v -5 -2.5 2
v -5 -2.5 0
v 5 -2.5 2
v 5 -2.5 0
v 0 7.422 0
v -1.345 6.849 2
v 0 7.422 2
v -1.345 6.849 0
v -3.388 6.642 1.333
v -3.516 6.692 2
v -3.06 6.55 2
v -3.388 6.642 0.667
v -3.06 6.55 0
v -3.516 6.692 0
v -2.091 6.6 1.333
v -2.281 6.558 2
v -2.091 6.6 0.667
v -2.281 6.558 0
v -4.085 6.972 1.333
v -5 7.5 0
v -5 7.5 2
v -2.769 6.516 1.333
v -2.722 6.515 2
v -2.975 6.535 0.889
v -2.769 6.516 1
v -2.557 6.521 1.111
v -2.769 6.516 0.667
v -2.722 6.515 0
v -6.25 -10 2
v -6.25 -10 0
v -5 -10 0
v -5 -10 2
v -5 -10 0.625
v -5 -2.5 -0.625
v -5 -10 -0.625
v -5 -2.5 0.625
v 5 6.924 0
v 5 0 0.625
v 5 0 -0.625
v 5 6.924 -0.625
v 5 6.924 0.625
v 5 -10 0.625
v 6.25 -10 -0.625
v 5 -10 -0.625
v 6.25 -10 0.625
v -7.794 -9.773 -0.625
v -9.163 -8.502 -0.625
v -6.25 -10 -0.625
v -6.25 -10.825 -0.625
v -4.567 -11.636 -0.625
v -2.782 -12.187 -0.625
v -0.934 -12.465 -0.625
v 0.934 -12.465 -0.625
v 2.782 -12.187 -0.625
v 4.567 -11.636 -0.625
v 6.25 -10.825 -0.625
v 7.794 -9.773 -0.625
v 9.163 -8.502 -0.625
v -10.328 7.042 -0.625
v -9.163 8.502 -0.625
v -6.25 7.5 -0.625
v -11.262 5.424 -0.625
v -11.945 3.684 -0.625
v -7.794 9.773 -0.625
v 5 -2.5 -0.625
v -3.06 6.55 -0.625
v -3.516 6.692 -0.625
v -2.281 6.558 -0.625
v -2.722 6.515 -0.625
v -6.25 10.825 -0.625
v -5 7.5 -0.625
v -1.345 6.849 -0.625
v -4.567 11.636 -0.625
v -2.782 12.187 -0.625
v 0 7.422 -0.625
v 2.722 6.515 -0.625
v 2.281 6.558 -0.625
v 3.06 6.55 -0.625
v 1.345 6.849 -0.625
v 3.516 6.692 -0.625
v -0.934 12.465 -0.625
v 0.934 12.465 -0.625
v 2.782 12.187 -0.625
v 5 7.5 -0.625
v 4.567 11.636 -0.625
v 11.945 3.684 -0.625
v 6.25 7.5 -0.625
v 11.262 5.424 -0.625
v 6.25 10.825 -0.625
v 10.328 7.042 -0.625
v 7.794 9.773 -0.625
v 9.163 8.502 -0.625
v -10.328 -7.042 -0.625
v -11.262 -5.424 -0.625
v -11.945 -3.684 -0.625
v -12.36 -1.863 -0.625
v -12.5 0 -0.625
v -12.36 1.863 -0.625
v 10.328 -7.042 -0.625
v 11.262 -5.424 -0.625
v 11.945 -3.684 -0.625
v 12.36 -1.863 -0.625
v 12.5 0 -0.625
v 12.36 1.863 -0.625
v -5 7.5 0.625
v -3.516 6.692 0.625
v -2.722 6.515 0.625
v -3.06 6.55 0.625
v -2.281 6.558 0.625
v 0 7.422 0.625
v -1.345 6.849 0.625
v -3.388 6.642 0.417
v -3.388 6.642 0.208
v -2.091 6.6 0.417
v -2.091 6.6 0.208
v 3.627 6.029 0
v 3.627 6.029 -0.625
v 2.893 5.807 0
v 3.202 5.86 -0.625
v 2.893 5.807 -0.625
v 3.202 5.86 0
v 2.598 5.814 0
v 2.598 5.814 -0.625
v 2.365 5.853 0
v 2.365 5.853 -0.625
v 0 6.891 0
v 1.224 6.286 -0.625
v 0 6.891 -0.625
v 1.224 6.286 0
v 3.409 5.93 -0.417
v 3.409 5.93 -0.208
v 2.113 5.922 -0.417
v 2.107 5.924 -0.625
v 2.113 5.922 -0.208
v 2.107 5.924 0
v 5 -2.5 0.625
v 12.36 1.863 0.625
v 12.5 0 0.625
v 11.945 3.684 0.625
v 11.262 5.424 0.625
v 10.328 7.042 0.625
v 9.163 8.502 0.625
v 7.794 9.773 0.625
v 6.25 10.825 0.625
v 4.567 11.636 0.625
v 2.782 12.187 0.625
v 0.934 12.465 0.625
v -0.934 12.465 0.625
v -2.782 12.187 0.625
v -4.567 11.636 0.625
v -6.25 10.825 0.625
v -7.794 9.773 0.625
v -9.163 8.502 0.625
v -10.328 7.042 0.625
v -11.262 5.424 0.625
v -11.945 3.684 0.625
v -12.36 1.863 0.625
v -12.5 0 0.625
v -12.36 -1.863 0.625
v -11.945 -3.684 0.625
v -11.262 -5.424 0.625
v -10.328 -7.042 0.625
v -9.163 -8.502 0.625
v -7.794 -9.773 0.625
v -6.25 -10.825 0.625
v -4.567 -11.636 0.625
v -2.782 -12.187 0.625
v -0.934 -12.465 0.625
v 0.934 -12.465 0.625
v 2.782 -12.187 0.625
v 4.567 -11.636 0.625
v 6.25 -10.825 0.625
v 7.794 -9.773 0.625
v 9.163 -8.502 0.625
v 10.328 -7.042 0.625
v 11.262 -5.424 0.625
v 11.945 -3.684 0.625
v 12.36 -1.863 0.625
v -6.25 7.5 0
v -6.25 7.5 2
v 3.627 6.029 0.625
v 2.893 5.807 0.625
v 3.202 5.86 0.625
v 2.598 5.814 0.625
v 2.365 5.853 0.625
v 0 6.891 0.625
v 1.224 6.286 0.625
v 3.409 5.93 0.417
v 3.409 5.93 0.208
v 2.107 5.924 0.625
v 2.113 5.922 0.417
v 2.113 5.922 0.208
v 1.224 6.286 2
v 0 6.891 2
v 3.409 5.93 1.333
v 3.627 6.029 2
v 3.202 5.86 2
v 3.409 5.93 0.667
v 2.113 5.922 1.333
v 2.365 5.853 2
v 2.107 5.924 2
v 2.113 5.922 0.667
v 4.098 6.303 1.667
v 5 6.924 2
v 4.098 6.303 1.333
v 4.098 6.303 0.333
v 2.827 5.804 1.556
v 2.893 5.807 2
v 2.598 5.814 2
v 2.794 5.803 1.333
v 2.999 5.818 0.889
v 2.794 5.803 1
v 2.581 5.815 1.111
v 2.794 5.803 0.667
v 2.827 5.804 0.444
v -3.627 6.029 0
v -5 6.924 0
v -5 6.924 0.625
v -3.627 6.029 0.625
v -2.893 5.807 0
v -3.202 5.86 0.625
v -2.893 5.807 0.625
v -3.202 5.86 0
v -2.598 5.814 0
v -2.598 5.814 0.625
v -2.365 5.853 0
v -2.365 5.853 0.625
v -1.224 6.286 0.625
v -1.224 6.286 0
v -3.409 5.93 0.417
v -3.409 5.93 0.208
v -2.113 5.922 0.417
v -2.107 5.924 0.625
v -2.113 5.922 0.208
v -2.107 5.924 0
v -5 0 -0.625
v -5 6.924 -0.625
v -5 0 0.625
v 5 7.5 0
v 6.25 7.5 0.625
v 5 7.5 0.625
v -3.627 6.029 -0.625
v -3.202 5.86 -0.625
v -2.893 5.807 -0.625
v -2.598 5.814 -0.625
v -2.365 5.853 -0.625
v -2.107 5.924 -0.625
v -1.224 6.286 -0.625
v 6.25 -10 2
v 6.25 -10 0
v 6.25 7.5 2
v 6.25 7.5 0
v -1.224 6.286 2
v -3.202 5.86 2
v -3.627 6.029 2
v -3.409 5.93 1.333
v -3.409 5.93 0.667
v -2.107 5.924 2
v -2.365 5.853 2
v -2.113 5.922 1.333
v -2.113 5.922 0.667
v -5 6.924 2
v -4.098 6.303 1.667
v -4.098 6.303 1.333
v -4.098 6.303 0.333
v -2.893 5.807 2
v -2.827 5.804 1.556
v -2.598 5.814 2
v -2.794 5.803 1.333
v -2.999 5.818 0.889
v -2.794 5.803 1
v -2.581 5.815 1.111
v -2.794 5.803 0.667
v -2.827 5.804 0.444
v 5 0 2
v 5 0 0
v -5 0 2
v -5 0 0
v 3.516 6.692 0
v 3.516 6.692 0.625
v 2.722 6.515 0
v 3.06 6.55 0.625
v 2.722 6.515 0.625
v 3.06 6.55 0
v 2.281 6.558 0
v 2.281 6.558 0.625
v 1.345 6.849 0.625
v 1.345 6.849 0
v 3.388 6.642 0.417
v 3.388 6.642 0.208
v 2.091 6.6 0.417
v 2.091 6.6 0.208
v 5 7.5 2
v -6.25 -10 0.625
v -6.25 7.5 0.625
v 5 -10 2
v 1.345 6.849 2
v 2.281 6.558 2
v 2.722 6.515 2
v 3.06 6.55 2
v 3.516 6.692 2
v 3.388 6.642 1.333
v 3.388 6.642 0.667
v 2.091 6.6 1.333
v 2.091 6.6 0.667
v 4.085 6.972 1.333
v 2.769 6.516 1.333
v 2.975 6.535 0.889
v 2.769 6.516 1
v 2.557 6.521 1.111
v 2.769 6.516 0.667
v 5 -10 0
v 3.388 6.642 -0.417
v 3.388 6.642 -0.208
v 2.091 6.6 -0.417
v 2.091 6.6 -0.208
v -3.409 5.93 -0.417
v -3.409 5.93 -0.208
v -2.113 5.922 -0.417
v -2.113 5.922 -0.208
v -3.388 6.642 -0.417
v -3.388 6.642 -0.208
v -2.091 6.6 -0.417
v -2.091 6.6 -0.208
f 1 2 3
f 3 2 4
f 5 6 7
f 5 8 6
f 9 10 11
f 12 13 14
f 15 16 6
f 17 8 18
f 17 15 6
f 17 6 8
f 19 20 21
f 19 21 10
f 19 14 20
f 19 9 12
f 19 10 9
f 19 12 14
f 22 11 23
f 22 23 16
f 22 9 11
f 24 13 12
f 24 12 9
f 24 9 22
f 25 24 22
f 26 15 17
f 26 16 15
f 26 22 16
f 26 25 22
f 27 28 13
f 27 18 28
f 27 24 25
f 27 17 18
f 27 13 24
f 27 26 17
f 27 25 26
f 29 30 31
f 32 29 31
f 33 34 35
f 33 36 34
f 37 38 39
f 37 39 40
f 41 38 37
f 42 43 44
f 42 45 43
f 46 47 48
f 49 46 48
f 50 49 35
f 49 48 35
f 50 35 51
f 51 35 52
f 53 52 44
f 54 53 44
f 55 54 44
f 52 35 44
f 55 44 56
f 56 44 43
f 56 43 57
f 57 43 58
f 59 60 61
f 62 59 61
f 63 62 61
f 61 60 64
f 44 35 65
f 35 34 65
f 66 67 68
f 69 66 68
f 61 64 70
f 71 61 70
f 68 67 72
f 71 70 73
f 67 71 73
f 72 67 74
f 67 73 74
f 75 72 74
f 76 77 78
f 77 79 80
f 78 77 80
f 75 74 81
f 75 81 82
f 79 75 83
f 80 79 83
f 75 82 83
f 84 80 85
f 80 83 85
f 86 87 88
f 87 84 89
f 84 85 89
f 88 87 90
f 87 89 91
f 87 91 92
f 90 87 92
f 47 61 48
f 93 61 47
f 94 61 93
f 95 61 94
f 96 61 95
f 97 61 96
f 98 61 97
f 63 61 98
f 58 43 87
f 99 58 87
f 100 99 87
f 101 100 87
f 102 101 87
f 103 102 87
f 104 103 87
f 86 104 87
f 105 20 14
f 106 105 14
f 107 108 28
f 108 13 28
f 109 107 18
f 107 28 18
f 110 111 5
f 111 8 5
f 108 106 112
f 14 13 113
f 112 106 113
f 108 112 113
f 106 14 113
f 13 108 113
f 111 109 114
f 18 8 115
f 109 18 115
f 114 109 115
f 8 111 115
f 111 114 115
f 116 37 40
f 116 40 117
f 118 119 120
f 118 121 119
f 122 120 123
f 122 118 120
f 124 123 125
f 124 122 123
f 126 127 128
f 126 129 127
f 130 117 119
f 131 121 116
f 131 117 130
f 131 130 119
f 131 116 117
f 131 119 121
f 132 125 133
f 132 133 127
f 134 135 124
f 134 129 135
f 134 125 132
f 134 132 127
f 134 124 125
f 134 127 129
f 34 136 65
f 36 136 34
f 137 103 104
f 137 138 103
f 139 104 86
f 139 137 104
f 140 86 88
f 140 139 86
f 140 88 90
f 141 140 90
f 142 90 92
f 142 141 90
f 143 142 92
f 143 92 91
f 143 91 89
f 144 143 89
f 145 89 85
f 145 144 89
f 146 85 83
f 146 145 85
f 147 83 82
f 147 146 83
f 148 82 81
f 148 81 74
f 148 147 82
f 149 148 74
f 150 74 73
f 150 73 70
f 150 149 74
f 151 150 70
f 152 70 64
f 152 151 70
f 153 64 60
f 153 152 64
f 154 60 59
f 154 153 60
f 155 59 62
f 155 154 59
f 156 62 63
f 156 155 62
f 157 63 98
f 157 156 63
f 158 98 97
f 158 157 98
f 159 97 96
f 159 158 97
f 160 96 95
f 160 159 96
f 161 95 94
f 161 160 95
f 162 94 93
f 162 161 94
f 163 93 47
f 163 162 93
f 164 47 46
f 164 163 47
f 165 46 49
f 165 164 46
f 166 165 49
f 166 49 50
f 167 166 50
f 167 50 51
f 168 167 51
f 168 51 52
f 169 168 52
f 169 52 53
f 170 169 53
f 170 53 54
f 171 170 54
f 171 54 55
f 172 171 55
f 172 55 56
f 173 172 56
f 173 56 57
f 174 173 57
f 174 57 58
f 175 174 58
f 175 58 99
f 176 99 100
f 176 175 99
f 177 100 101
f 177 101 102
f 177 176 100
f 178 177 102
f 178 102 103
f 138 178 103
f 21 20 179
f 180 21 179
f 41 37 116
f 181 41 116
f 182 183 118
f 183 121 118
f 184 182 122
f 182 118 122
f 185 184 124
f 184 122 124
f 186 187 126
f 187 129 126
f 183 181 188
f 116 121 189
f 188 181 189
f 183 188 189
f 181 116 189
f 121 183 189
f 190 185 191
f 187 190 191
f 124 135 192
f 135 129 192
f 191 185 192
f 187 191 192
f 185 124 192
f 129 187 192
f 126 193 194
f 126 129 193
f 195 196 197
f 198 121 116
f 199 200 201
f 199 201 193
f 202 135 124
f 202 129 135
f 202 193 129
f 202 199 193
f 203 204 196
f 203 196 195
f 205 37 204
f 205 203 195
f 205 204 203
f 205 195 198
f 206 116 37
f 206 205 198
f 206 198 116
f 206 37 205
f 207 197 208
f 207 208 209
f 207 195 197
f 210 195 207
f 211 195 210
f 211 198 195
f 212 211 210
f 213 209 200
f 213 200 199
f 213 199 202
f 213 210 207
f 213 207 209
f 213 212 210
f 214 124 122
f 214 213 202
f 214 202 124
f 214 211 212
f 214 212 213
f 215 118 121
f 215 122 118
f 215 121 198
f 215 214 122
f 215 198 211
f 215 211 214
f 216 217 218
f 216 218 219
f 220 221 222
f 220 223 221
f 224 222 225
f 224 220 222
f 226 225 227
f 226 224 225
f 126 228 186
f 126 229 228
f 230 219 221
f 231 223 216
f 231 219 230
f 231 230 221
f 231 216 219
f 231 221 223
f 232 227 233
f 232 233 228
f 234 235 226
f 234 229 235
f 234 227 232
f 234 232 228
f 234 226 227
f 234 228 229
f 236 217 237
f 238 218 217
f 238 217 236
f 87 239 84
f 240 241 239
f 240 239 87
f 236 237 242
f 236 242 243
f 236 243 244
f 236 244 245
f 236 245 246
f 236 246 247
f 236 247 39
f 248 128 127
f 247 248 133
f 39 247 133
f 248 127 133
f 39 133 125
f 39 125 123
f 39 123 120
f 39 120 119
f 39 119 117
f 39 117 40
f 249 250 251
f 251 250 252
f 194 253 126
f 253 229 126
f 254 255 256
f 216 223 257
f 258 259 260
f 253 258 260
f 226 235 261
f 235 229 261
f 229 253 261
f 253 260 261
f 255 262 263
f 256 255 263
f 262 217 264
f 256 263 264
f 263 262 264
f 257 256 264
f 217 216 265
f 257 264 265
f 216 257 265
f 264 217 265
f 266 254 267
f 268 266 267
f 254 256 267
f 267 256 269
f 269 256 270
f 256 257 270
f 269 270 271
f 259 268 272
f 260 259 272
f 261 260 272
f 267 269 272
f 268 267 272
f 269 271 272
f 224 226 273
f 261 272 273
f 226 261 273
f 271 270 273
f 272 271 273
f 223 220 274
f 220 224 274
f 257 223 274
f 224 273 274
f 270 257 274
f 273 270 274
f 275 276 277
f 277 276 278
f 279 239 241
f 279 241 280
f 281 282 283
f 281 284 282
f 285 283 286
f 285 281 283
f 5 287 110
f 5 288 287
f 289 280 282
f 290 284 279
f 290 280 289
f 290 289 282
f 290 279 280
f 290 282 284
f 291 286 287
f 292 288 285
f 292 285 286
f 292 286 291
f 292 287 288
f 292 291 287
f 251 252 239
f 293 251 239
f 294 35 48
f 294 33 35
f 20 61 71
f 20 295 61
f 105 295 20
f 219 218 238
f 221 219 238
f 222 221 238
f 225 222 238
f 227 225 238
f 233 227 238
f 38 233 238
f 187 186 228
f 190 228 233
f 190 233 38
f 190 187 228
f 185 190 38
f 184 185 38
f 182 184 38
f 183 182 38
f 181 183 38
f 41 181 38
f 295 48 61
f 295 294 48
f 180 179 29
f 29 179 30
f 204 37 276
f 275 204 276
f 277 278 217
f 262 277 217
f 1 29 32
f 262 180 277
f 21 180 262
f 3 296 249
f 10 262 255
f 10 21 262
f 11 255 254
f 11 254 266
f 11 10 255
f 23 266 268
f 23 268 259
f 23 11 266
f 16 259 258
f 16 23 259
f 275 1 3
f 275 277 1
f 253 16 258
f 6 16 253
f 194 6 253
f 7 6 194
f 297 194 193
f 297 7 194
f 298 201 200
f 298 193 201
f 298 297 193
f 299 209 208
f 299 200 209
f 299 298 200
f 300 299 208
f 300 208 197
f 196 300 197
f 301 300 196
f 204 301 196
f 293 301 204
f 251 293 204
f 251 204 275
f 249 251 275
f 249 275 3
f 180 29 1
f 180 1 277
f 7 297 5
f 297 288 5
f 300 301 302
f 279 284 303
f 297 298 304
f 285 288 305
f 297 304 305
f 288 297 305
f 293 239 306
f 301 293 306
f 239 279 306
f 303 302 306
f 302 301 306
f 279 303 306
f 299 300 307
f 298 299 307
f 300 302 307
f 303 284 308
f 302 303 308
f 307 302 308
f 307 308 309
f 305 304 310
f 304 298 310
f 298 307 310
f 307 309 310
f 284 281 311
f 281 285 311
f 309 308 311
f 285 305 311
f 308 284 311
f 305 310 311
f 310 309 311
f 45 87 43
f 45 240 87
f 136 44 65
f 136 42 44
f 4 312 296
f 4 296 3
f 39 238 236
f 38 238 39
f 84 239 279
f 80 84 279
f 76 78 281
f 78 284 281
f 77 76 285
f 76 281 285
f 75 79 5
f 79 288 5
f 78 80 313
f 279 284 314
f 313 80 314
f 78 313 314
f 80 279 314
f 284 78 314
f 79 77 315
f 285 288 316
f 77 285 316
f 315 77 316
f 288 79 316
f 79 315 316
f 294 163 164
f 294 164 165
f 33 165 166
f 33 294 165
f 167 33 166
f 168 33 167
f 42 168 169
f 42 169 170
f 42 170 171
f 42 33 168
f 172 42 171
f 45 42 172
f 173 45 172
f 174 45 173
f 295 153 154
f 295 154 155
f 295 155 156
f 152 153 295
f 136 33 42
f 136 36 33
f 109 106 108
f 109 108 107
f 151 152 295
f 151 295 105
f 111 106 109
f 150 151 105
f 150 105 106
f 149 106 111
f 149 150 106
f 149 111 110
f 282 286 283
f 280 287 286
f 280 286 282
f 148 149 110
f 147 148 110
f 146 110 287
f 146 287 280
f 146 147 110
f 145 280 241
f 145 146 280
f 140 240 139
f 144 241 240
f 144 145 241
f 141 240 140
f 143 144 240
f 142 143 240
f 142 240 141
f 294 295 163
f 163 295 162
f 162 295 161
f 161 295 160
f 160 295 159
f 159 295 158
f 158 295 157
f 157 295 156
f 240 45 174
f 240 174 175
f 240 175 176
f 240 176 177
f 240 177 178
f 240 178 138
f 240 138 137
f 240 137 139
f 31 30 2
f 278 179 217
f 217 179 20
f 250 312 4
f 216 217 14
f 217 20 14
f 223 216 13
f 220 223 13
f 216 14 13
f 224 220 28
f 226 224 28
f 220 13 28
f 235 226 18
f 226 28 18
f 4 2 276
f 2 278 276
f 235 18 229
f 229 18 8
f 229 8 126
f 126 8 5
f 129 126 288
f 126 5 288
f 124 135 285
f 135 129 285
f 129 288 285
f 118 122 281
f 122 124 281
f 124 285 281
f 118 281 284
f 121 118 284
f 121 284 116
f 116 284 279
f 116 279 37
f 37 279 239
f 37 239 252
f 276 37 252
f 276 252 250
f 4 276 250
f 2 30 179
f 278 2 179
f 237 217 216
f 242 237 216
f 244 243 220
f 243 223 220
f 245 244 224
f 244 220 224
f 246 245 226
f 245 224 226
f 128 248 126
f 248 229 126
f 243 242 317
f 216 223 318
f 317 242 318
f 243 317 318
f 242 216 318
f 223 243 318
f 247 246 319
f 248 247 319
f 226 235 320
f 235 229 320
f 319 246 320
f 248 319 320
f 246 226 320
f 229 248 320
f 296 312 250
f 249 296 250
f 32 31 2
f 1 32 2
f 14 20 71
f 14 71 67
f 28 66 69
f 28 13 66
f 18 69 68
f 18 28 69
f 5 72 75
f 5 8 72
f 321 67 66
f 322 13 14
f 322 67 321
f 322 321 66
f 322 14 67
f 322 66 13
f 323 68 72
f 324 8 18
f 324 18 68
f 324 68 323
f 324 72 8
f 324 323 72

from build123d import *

# Parameters (mm, degrees)
F1_DEPTH = 0.625
F0_R     = 12.5
F0_W     = 1.25
F0_H     = 7.5
F2_DEPTH = 2


with BuildPart() as f1:
    # F0 (on Top) → F1 (new body, symmetric)
    with BuildSketch(Plane.XY):
        with BuildLine():
            Line((-5, 6.9237351418), (-5, 0))
            Line((-5, 0), (5, 0))
            Line((5, 0), (5, 6.9237351418))
            add(Edge.make_bspline(
                [(5, 6.9237351418), (2.8915624134, 5.4354998283), (2.8915624134, 5.4349666461), (0, 6.8908487447)],
                knots=[0, 0, 0, 0, 5.0001081503, 5.0001081503, 5.0001081503, 5.0001081503], degree=3))
            add(Edge.make_bspline(
                [(-5, 6.9237351418), (-2.8915624134, 5.4354998283), (-2.8915624134, 5.4349666461), (0, 6.8908487447)],
                knots=[0, 0, 0, 0, 5.0001081503, 5.0001081503, 5.0001081503, 5.0001081503], degree=3))
        make_face()
    extrude(amount=F1_DEPTH, both=True)


with BuildPart() as f1b:
    # F0 (on Top) → F1, piece 2 (new body, symmetric)
    with BuildSketch(Plane.XY):
        Circle(F0_R)
        with BuildLine():
            Line((5, -2.5), (-5, -2.5))
            Line((-5, -2.5), (-5, -10))
            Line((-5, -10), (-6.25, -10))
            Line((-6.25, -10), (-6.25, -2.5))
            Line((-6.25, -2.5), (-6.25, 0))
            Line((-6.25, 0), (-6.25, 7.5))
            Line((-6.25, 7.5), (-5, 7.5))
            add(Edge.make_bspline(
                [(-5, 7.5), (-2.8592094313, 6.2499786727), (-2.8592094313, 6.1529199593), (0, 7.4215326458)],
                knots=[0, 0, 0, 0, 5.0006156747, 5.0006156747, 5.0006156747, 5.0006156747], degree=3))
            add(Edge.make_bspline(
                [(5, 7.5), (2.8592094313, 6.2499786727), (2.8592094313, 6.1529199593), (0, 7.4215326458)],
                knots=[0, 0, 0, 0, 5.0006156747, 5.0006156747, 5.0006156747, 5.0006156747], degree=3))
            Line((5, 7.5), (6.25, 7.5))
            Line((6.25, 7.5), (6.25, 0))
            Line((6.25, 0), (6.25, -2.5))
            Line((6.25, -2.5), (6.25, -10))
            Line((6.25, -10), (5, -10))
            Line((5, -10), (5, -2.5))
        make_face(mode=Mode.SUBTRACT)
    extrude(amount=F1_DEPTH, both=True)


with BuildPart() as f2:
    # F0 (on Top) → F2 (new body)
    with BuildSketch(Plane.XY):
        with Locations((-5.625, -6.25)):
            Rectangle(F0_W, F0_H)
        Polygon((-6.25, -2.5), (-5, -2.5), (5, -2.5), (6.25, -2.5), (6.25, 0), (5, 0), (-5, 0), (-6.25, 0), align=None)
        Polygon((-6.25, 7.5), (-6.25, 0), (-5, 0), (-5, 6.9237351418), (-5, 7.5), align=None)
        with BuildLine():
            Line((-5, 7.5), (-5, 6.9237351418))
            add(Edge.make_bspline(
                [(-5, 6.9237351418), (-2.8915624134, 5.4354998283), (-2.8915624134, 5.4349666461), (0, 6.8908487447)],
                knots=[0, 0, 0, 0, 5.0001081503, 5.0001081503, 5.0001081503, 5.0001081503], degree=3))
            add(Edge.make_bspline(
                [(5, 6.9237351418), (2.8915624134, 5.4354998283), (2.8915624134, 5.4349666461), (0, 6.8908487447)],
                knots=[0, 0, 0, 0, 5.0001081503, 5.0001081503, 5.0001081503, 5.0001081503], degree=3))
            Line((5, 6.9237351418), (5, 7.5))
            add(Edge.make_bspline(
                [(5, 7.5), (2.8592094313, 6.2499786727), (2.8592094313, 6.1529199593), (0, 7.4215326458)],
                knots=[0, 0, 0, 0, 5.0006156747, 5.0006156747, 5.0006156747, 5.0006156747], degree=3))
            add(Edge.make_bspline(
                [(-5, 7.5), (-2.8592094313, 6.2499786727), (-2.8592094313, 6.1529199593), (0, 7.4215326458)],
                knots=[0, 0, 0, 0, 5.0006156747, 5.0006156747, 5.0006156747, 5.0006156747], degree=3))
        make_face()
        Polygon((5, 0), (6.25, 0), (6.25, 7.5), (5, 7.5), (5, 6.9237351418), align=None)
        with Locations((5.625, -6.25)):
            Rectangle(F0_W, F0_H)
    extrude(amount=F2_DEPTH)


with BuildPart() as f3_1:
    # F3: copy of F1b
    add(f1b.part.moved(Location((30, 0, 0))))


solid = Compound([f1.part, f1b.part, f2.part])
